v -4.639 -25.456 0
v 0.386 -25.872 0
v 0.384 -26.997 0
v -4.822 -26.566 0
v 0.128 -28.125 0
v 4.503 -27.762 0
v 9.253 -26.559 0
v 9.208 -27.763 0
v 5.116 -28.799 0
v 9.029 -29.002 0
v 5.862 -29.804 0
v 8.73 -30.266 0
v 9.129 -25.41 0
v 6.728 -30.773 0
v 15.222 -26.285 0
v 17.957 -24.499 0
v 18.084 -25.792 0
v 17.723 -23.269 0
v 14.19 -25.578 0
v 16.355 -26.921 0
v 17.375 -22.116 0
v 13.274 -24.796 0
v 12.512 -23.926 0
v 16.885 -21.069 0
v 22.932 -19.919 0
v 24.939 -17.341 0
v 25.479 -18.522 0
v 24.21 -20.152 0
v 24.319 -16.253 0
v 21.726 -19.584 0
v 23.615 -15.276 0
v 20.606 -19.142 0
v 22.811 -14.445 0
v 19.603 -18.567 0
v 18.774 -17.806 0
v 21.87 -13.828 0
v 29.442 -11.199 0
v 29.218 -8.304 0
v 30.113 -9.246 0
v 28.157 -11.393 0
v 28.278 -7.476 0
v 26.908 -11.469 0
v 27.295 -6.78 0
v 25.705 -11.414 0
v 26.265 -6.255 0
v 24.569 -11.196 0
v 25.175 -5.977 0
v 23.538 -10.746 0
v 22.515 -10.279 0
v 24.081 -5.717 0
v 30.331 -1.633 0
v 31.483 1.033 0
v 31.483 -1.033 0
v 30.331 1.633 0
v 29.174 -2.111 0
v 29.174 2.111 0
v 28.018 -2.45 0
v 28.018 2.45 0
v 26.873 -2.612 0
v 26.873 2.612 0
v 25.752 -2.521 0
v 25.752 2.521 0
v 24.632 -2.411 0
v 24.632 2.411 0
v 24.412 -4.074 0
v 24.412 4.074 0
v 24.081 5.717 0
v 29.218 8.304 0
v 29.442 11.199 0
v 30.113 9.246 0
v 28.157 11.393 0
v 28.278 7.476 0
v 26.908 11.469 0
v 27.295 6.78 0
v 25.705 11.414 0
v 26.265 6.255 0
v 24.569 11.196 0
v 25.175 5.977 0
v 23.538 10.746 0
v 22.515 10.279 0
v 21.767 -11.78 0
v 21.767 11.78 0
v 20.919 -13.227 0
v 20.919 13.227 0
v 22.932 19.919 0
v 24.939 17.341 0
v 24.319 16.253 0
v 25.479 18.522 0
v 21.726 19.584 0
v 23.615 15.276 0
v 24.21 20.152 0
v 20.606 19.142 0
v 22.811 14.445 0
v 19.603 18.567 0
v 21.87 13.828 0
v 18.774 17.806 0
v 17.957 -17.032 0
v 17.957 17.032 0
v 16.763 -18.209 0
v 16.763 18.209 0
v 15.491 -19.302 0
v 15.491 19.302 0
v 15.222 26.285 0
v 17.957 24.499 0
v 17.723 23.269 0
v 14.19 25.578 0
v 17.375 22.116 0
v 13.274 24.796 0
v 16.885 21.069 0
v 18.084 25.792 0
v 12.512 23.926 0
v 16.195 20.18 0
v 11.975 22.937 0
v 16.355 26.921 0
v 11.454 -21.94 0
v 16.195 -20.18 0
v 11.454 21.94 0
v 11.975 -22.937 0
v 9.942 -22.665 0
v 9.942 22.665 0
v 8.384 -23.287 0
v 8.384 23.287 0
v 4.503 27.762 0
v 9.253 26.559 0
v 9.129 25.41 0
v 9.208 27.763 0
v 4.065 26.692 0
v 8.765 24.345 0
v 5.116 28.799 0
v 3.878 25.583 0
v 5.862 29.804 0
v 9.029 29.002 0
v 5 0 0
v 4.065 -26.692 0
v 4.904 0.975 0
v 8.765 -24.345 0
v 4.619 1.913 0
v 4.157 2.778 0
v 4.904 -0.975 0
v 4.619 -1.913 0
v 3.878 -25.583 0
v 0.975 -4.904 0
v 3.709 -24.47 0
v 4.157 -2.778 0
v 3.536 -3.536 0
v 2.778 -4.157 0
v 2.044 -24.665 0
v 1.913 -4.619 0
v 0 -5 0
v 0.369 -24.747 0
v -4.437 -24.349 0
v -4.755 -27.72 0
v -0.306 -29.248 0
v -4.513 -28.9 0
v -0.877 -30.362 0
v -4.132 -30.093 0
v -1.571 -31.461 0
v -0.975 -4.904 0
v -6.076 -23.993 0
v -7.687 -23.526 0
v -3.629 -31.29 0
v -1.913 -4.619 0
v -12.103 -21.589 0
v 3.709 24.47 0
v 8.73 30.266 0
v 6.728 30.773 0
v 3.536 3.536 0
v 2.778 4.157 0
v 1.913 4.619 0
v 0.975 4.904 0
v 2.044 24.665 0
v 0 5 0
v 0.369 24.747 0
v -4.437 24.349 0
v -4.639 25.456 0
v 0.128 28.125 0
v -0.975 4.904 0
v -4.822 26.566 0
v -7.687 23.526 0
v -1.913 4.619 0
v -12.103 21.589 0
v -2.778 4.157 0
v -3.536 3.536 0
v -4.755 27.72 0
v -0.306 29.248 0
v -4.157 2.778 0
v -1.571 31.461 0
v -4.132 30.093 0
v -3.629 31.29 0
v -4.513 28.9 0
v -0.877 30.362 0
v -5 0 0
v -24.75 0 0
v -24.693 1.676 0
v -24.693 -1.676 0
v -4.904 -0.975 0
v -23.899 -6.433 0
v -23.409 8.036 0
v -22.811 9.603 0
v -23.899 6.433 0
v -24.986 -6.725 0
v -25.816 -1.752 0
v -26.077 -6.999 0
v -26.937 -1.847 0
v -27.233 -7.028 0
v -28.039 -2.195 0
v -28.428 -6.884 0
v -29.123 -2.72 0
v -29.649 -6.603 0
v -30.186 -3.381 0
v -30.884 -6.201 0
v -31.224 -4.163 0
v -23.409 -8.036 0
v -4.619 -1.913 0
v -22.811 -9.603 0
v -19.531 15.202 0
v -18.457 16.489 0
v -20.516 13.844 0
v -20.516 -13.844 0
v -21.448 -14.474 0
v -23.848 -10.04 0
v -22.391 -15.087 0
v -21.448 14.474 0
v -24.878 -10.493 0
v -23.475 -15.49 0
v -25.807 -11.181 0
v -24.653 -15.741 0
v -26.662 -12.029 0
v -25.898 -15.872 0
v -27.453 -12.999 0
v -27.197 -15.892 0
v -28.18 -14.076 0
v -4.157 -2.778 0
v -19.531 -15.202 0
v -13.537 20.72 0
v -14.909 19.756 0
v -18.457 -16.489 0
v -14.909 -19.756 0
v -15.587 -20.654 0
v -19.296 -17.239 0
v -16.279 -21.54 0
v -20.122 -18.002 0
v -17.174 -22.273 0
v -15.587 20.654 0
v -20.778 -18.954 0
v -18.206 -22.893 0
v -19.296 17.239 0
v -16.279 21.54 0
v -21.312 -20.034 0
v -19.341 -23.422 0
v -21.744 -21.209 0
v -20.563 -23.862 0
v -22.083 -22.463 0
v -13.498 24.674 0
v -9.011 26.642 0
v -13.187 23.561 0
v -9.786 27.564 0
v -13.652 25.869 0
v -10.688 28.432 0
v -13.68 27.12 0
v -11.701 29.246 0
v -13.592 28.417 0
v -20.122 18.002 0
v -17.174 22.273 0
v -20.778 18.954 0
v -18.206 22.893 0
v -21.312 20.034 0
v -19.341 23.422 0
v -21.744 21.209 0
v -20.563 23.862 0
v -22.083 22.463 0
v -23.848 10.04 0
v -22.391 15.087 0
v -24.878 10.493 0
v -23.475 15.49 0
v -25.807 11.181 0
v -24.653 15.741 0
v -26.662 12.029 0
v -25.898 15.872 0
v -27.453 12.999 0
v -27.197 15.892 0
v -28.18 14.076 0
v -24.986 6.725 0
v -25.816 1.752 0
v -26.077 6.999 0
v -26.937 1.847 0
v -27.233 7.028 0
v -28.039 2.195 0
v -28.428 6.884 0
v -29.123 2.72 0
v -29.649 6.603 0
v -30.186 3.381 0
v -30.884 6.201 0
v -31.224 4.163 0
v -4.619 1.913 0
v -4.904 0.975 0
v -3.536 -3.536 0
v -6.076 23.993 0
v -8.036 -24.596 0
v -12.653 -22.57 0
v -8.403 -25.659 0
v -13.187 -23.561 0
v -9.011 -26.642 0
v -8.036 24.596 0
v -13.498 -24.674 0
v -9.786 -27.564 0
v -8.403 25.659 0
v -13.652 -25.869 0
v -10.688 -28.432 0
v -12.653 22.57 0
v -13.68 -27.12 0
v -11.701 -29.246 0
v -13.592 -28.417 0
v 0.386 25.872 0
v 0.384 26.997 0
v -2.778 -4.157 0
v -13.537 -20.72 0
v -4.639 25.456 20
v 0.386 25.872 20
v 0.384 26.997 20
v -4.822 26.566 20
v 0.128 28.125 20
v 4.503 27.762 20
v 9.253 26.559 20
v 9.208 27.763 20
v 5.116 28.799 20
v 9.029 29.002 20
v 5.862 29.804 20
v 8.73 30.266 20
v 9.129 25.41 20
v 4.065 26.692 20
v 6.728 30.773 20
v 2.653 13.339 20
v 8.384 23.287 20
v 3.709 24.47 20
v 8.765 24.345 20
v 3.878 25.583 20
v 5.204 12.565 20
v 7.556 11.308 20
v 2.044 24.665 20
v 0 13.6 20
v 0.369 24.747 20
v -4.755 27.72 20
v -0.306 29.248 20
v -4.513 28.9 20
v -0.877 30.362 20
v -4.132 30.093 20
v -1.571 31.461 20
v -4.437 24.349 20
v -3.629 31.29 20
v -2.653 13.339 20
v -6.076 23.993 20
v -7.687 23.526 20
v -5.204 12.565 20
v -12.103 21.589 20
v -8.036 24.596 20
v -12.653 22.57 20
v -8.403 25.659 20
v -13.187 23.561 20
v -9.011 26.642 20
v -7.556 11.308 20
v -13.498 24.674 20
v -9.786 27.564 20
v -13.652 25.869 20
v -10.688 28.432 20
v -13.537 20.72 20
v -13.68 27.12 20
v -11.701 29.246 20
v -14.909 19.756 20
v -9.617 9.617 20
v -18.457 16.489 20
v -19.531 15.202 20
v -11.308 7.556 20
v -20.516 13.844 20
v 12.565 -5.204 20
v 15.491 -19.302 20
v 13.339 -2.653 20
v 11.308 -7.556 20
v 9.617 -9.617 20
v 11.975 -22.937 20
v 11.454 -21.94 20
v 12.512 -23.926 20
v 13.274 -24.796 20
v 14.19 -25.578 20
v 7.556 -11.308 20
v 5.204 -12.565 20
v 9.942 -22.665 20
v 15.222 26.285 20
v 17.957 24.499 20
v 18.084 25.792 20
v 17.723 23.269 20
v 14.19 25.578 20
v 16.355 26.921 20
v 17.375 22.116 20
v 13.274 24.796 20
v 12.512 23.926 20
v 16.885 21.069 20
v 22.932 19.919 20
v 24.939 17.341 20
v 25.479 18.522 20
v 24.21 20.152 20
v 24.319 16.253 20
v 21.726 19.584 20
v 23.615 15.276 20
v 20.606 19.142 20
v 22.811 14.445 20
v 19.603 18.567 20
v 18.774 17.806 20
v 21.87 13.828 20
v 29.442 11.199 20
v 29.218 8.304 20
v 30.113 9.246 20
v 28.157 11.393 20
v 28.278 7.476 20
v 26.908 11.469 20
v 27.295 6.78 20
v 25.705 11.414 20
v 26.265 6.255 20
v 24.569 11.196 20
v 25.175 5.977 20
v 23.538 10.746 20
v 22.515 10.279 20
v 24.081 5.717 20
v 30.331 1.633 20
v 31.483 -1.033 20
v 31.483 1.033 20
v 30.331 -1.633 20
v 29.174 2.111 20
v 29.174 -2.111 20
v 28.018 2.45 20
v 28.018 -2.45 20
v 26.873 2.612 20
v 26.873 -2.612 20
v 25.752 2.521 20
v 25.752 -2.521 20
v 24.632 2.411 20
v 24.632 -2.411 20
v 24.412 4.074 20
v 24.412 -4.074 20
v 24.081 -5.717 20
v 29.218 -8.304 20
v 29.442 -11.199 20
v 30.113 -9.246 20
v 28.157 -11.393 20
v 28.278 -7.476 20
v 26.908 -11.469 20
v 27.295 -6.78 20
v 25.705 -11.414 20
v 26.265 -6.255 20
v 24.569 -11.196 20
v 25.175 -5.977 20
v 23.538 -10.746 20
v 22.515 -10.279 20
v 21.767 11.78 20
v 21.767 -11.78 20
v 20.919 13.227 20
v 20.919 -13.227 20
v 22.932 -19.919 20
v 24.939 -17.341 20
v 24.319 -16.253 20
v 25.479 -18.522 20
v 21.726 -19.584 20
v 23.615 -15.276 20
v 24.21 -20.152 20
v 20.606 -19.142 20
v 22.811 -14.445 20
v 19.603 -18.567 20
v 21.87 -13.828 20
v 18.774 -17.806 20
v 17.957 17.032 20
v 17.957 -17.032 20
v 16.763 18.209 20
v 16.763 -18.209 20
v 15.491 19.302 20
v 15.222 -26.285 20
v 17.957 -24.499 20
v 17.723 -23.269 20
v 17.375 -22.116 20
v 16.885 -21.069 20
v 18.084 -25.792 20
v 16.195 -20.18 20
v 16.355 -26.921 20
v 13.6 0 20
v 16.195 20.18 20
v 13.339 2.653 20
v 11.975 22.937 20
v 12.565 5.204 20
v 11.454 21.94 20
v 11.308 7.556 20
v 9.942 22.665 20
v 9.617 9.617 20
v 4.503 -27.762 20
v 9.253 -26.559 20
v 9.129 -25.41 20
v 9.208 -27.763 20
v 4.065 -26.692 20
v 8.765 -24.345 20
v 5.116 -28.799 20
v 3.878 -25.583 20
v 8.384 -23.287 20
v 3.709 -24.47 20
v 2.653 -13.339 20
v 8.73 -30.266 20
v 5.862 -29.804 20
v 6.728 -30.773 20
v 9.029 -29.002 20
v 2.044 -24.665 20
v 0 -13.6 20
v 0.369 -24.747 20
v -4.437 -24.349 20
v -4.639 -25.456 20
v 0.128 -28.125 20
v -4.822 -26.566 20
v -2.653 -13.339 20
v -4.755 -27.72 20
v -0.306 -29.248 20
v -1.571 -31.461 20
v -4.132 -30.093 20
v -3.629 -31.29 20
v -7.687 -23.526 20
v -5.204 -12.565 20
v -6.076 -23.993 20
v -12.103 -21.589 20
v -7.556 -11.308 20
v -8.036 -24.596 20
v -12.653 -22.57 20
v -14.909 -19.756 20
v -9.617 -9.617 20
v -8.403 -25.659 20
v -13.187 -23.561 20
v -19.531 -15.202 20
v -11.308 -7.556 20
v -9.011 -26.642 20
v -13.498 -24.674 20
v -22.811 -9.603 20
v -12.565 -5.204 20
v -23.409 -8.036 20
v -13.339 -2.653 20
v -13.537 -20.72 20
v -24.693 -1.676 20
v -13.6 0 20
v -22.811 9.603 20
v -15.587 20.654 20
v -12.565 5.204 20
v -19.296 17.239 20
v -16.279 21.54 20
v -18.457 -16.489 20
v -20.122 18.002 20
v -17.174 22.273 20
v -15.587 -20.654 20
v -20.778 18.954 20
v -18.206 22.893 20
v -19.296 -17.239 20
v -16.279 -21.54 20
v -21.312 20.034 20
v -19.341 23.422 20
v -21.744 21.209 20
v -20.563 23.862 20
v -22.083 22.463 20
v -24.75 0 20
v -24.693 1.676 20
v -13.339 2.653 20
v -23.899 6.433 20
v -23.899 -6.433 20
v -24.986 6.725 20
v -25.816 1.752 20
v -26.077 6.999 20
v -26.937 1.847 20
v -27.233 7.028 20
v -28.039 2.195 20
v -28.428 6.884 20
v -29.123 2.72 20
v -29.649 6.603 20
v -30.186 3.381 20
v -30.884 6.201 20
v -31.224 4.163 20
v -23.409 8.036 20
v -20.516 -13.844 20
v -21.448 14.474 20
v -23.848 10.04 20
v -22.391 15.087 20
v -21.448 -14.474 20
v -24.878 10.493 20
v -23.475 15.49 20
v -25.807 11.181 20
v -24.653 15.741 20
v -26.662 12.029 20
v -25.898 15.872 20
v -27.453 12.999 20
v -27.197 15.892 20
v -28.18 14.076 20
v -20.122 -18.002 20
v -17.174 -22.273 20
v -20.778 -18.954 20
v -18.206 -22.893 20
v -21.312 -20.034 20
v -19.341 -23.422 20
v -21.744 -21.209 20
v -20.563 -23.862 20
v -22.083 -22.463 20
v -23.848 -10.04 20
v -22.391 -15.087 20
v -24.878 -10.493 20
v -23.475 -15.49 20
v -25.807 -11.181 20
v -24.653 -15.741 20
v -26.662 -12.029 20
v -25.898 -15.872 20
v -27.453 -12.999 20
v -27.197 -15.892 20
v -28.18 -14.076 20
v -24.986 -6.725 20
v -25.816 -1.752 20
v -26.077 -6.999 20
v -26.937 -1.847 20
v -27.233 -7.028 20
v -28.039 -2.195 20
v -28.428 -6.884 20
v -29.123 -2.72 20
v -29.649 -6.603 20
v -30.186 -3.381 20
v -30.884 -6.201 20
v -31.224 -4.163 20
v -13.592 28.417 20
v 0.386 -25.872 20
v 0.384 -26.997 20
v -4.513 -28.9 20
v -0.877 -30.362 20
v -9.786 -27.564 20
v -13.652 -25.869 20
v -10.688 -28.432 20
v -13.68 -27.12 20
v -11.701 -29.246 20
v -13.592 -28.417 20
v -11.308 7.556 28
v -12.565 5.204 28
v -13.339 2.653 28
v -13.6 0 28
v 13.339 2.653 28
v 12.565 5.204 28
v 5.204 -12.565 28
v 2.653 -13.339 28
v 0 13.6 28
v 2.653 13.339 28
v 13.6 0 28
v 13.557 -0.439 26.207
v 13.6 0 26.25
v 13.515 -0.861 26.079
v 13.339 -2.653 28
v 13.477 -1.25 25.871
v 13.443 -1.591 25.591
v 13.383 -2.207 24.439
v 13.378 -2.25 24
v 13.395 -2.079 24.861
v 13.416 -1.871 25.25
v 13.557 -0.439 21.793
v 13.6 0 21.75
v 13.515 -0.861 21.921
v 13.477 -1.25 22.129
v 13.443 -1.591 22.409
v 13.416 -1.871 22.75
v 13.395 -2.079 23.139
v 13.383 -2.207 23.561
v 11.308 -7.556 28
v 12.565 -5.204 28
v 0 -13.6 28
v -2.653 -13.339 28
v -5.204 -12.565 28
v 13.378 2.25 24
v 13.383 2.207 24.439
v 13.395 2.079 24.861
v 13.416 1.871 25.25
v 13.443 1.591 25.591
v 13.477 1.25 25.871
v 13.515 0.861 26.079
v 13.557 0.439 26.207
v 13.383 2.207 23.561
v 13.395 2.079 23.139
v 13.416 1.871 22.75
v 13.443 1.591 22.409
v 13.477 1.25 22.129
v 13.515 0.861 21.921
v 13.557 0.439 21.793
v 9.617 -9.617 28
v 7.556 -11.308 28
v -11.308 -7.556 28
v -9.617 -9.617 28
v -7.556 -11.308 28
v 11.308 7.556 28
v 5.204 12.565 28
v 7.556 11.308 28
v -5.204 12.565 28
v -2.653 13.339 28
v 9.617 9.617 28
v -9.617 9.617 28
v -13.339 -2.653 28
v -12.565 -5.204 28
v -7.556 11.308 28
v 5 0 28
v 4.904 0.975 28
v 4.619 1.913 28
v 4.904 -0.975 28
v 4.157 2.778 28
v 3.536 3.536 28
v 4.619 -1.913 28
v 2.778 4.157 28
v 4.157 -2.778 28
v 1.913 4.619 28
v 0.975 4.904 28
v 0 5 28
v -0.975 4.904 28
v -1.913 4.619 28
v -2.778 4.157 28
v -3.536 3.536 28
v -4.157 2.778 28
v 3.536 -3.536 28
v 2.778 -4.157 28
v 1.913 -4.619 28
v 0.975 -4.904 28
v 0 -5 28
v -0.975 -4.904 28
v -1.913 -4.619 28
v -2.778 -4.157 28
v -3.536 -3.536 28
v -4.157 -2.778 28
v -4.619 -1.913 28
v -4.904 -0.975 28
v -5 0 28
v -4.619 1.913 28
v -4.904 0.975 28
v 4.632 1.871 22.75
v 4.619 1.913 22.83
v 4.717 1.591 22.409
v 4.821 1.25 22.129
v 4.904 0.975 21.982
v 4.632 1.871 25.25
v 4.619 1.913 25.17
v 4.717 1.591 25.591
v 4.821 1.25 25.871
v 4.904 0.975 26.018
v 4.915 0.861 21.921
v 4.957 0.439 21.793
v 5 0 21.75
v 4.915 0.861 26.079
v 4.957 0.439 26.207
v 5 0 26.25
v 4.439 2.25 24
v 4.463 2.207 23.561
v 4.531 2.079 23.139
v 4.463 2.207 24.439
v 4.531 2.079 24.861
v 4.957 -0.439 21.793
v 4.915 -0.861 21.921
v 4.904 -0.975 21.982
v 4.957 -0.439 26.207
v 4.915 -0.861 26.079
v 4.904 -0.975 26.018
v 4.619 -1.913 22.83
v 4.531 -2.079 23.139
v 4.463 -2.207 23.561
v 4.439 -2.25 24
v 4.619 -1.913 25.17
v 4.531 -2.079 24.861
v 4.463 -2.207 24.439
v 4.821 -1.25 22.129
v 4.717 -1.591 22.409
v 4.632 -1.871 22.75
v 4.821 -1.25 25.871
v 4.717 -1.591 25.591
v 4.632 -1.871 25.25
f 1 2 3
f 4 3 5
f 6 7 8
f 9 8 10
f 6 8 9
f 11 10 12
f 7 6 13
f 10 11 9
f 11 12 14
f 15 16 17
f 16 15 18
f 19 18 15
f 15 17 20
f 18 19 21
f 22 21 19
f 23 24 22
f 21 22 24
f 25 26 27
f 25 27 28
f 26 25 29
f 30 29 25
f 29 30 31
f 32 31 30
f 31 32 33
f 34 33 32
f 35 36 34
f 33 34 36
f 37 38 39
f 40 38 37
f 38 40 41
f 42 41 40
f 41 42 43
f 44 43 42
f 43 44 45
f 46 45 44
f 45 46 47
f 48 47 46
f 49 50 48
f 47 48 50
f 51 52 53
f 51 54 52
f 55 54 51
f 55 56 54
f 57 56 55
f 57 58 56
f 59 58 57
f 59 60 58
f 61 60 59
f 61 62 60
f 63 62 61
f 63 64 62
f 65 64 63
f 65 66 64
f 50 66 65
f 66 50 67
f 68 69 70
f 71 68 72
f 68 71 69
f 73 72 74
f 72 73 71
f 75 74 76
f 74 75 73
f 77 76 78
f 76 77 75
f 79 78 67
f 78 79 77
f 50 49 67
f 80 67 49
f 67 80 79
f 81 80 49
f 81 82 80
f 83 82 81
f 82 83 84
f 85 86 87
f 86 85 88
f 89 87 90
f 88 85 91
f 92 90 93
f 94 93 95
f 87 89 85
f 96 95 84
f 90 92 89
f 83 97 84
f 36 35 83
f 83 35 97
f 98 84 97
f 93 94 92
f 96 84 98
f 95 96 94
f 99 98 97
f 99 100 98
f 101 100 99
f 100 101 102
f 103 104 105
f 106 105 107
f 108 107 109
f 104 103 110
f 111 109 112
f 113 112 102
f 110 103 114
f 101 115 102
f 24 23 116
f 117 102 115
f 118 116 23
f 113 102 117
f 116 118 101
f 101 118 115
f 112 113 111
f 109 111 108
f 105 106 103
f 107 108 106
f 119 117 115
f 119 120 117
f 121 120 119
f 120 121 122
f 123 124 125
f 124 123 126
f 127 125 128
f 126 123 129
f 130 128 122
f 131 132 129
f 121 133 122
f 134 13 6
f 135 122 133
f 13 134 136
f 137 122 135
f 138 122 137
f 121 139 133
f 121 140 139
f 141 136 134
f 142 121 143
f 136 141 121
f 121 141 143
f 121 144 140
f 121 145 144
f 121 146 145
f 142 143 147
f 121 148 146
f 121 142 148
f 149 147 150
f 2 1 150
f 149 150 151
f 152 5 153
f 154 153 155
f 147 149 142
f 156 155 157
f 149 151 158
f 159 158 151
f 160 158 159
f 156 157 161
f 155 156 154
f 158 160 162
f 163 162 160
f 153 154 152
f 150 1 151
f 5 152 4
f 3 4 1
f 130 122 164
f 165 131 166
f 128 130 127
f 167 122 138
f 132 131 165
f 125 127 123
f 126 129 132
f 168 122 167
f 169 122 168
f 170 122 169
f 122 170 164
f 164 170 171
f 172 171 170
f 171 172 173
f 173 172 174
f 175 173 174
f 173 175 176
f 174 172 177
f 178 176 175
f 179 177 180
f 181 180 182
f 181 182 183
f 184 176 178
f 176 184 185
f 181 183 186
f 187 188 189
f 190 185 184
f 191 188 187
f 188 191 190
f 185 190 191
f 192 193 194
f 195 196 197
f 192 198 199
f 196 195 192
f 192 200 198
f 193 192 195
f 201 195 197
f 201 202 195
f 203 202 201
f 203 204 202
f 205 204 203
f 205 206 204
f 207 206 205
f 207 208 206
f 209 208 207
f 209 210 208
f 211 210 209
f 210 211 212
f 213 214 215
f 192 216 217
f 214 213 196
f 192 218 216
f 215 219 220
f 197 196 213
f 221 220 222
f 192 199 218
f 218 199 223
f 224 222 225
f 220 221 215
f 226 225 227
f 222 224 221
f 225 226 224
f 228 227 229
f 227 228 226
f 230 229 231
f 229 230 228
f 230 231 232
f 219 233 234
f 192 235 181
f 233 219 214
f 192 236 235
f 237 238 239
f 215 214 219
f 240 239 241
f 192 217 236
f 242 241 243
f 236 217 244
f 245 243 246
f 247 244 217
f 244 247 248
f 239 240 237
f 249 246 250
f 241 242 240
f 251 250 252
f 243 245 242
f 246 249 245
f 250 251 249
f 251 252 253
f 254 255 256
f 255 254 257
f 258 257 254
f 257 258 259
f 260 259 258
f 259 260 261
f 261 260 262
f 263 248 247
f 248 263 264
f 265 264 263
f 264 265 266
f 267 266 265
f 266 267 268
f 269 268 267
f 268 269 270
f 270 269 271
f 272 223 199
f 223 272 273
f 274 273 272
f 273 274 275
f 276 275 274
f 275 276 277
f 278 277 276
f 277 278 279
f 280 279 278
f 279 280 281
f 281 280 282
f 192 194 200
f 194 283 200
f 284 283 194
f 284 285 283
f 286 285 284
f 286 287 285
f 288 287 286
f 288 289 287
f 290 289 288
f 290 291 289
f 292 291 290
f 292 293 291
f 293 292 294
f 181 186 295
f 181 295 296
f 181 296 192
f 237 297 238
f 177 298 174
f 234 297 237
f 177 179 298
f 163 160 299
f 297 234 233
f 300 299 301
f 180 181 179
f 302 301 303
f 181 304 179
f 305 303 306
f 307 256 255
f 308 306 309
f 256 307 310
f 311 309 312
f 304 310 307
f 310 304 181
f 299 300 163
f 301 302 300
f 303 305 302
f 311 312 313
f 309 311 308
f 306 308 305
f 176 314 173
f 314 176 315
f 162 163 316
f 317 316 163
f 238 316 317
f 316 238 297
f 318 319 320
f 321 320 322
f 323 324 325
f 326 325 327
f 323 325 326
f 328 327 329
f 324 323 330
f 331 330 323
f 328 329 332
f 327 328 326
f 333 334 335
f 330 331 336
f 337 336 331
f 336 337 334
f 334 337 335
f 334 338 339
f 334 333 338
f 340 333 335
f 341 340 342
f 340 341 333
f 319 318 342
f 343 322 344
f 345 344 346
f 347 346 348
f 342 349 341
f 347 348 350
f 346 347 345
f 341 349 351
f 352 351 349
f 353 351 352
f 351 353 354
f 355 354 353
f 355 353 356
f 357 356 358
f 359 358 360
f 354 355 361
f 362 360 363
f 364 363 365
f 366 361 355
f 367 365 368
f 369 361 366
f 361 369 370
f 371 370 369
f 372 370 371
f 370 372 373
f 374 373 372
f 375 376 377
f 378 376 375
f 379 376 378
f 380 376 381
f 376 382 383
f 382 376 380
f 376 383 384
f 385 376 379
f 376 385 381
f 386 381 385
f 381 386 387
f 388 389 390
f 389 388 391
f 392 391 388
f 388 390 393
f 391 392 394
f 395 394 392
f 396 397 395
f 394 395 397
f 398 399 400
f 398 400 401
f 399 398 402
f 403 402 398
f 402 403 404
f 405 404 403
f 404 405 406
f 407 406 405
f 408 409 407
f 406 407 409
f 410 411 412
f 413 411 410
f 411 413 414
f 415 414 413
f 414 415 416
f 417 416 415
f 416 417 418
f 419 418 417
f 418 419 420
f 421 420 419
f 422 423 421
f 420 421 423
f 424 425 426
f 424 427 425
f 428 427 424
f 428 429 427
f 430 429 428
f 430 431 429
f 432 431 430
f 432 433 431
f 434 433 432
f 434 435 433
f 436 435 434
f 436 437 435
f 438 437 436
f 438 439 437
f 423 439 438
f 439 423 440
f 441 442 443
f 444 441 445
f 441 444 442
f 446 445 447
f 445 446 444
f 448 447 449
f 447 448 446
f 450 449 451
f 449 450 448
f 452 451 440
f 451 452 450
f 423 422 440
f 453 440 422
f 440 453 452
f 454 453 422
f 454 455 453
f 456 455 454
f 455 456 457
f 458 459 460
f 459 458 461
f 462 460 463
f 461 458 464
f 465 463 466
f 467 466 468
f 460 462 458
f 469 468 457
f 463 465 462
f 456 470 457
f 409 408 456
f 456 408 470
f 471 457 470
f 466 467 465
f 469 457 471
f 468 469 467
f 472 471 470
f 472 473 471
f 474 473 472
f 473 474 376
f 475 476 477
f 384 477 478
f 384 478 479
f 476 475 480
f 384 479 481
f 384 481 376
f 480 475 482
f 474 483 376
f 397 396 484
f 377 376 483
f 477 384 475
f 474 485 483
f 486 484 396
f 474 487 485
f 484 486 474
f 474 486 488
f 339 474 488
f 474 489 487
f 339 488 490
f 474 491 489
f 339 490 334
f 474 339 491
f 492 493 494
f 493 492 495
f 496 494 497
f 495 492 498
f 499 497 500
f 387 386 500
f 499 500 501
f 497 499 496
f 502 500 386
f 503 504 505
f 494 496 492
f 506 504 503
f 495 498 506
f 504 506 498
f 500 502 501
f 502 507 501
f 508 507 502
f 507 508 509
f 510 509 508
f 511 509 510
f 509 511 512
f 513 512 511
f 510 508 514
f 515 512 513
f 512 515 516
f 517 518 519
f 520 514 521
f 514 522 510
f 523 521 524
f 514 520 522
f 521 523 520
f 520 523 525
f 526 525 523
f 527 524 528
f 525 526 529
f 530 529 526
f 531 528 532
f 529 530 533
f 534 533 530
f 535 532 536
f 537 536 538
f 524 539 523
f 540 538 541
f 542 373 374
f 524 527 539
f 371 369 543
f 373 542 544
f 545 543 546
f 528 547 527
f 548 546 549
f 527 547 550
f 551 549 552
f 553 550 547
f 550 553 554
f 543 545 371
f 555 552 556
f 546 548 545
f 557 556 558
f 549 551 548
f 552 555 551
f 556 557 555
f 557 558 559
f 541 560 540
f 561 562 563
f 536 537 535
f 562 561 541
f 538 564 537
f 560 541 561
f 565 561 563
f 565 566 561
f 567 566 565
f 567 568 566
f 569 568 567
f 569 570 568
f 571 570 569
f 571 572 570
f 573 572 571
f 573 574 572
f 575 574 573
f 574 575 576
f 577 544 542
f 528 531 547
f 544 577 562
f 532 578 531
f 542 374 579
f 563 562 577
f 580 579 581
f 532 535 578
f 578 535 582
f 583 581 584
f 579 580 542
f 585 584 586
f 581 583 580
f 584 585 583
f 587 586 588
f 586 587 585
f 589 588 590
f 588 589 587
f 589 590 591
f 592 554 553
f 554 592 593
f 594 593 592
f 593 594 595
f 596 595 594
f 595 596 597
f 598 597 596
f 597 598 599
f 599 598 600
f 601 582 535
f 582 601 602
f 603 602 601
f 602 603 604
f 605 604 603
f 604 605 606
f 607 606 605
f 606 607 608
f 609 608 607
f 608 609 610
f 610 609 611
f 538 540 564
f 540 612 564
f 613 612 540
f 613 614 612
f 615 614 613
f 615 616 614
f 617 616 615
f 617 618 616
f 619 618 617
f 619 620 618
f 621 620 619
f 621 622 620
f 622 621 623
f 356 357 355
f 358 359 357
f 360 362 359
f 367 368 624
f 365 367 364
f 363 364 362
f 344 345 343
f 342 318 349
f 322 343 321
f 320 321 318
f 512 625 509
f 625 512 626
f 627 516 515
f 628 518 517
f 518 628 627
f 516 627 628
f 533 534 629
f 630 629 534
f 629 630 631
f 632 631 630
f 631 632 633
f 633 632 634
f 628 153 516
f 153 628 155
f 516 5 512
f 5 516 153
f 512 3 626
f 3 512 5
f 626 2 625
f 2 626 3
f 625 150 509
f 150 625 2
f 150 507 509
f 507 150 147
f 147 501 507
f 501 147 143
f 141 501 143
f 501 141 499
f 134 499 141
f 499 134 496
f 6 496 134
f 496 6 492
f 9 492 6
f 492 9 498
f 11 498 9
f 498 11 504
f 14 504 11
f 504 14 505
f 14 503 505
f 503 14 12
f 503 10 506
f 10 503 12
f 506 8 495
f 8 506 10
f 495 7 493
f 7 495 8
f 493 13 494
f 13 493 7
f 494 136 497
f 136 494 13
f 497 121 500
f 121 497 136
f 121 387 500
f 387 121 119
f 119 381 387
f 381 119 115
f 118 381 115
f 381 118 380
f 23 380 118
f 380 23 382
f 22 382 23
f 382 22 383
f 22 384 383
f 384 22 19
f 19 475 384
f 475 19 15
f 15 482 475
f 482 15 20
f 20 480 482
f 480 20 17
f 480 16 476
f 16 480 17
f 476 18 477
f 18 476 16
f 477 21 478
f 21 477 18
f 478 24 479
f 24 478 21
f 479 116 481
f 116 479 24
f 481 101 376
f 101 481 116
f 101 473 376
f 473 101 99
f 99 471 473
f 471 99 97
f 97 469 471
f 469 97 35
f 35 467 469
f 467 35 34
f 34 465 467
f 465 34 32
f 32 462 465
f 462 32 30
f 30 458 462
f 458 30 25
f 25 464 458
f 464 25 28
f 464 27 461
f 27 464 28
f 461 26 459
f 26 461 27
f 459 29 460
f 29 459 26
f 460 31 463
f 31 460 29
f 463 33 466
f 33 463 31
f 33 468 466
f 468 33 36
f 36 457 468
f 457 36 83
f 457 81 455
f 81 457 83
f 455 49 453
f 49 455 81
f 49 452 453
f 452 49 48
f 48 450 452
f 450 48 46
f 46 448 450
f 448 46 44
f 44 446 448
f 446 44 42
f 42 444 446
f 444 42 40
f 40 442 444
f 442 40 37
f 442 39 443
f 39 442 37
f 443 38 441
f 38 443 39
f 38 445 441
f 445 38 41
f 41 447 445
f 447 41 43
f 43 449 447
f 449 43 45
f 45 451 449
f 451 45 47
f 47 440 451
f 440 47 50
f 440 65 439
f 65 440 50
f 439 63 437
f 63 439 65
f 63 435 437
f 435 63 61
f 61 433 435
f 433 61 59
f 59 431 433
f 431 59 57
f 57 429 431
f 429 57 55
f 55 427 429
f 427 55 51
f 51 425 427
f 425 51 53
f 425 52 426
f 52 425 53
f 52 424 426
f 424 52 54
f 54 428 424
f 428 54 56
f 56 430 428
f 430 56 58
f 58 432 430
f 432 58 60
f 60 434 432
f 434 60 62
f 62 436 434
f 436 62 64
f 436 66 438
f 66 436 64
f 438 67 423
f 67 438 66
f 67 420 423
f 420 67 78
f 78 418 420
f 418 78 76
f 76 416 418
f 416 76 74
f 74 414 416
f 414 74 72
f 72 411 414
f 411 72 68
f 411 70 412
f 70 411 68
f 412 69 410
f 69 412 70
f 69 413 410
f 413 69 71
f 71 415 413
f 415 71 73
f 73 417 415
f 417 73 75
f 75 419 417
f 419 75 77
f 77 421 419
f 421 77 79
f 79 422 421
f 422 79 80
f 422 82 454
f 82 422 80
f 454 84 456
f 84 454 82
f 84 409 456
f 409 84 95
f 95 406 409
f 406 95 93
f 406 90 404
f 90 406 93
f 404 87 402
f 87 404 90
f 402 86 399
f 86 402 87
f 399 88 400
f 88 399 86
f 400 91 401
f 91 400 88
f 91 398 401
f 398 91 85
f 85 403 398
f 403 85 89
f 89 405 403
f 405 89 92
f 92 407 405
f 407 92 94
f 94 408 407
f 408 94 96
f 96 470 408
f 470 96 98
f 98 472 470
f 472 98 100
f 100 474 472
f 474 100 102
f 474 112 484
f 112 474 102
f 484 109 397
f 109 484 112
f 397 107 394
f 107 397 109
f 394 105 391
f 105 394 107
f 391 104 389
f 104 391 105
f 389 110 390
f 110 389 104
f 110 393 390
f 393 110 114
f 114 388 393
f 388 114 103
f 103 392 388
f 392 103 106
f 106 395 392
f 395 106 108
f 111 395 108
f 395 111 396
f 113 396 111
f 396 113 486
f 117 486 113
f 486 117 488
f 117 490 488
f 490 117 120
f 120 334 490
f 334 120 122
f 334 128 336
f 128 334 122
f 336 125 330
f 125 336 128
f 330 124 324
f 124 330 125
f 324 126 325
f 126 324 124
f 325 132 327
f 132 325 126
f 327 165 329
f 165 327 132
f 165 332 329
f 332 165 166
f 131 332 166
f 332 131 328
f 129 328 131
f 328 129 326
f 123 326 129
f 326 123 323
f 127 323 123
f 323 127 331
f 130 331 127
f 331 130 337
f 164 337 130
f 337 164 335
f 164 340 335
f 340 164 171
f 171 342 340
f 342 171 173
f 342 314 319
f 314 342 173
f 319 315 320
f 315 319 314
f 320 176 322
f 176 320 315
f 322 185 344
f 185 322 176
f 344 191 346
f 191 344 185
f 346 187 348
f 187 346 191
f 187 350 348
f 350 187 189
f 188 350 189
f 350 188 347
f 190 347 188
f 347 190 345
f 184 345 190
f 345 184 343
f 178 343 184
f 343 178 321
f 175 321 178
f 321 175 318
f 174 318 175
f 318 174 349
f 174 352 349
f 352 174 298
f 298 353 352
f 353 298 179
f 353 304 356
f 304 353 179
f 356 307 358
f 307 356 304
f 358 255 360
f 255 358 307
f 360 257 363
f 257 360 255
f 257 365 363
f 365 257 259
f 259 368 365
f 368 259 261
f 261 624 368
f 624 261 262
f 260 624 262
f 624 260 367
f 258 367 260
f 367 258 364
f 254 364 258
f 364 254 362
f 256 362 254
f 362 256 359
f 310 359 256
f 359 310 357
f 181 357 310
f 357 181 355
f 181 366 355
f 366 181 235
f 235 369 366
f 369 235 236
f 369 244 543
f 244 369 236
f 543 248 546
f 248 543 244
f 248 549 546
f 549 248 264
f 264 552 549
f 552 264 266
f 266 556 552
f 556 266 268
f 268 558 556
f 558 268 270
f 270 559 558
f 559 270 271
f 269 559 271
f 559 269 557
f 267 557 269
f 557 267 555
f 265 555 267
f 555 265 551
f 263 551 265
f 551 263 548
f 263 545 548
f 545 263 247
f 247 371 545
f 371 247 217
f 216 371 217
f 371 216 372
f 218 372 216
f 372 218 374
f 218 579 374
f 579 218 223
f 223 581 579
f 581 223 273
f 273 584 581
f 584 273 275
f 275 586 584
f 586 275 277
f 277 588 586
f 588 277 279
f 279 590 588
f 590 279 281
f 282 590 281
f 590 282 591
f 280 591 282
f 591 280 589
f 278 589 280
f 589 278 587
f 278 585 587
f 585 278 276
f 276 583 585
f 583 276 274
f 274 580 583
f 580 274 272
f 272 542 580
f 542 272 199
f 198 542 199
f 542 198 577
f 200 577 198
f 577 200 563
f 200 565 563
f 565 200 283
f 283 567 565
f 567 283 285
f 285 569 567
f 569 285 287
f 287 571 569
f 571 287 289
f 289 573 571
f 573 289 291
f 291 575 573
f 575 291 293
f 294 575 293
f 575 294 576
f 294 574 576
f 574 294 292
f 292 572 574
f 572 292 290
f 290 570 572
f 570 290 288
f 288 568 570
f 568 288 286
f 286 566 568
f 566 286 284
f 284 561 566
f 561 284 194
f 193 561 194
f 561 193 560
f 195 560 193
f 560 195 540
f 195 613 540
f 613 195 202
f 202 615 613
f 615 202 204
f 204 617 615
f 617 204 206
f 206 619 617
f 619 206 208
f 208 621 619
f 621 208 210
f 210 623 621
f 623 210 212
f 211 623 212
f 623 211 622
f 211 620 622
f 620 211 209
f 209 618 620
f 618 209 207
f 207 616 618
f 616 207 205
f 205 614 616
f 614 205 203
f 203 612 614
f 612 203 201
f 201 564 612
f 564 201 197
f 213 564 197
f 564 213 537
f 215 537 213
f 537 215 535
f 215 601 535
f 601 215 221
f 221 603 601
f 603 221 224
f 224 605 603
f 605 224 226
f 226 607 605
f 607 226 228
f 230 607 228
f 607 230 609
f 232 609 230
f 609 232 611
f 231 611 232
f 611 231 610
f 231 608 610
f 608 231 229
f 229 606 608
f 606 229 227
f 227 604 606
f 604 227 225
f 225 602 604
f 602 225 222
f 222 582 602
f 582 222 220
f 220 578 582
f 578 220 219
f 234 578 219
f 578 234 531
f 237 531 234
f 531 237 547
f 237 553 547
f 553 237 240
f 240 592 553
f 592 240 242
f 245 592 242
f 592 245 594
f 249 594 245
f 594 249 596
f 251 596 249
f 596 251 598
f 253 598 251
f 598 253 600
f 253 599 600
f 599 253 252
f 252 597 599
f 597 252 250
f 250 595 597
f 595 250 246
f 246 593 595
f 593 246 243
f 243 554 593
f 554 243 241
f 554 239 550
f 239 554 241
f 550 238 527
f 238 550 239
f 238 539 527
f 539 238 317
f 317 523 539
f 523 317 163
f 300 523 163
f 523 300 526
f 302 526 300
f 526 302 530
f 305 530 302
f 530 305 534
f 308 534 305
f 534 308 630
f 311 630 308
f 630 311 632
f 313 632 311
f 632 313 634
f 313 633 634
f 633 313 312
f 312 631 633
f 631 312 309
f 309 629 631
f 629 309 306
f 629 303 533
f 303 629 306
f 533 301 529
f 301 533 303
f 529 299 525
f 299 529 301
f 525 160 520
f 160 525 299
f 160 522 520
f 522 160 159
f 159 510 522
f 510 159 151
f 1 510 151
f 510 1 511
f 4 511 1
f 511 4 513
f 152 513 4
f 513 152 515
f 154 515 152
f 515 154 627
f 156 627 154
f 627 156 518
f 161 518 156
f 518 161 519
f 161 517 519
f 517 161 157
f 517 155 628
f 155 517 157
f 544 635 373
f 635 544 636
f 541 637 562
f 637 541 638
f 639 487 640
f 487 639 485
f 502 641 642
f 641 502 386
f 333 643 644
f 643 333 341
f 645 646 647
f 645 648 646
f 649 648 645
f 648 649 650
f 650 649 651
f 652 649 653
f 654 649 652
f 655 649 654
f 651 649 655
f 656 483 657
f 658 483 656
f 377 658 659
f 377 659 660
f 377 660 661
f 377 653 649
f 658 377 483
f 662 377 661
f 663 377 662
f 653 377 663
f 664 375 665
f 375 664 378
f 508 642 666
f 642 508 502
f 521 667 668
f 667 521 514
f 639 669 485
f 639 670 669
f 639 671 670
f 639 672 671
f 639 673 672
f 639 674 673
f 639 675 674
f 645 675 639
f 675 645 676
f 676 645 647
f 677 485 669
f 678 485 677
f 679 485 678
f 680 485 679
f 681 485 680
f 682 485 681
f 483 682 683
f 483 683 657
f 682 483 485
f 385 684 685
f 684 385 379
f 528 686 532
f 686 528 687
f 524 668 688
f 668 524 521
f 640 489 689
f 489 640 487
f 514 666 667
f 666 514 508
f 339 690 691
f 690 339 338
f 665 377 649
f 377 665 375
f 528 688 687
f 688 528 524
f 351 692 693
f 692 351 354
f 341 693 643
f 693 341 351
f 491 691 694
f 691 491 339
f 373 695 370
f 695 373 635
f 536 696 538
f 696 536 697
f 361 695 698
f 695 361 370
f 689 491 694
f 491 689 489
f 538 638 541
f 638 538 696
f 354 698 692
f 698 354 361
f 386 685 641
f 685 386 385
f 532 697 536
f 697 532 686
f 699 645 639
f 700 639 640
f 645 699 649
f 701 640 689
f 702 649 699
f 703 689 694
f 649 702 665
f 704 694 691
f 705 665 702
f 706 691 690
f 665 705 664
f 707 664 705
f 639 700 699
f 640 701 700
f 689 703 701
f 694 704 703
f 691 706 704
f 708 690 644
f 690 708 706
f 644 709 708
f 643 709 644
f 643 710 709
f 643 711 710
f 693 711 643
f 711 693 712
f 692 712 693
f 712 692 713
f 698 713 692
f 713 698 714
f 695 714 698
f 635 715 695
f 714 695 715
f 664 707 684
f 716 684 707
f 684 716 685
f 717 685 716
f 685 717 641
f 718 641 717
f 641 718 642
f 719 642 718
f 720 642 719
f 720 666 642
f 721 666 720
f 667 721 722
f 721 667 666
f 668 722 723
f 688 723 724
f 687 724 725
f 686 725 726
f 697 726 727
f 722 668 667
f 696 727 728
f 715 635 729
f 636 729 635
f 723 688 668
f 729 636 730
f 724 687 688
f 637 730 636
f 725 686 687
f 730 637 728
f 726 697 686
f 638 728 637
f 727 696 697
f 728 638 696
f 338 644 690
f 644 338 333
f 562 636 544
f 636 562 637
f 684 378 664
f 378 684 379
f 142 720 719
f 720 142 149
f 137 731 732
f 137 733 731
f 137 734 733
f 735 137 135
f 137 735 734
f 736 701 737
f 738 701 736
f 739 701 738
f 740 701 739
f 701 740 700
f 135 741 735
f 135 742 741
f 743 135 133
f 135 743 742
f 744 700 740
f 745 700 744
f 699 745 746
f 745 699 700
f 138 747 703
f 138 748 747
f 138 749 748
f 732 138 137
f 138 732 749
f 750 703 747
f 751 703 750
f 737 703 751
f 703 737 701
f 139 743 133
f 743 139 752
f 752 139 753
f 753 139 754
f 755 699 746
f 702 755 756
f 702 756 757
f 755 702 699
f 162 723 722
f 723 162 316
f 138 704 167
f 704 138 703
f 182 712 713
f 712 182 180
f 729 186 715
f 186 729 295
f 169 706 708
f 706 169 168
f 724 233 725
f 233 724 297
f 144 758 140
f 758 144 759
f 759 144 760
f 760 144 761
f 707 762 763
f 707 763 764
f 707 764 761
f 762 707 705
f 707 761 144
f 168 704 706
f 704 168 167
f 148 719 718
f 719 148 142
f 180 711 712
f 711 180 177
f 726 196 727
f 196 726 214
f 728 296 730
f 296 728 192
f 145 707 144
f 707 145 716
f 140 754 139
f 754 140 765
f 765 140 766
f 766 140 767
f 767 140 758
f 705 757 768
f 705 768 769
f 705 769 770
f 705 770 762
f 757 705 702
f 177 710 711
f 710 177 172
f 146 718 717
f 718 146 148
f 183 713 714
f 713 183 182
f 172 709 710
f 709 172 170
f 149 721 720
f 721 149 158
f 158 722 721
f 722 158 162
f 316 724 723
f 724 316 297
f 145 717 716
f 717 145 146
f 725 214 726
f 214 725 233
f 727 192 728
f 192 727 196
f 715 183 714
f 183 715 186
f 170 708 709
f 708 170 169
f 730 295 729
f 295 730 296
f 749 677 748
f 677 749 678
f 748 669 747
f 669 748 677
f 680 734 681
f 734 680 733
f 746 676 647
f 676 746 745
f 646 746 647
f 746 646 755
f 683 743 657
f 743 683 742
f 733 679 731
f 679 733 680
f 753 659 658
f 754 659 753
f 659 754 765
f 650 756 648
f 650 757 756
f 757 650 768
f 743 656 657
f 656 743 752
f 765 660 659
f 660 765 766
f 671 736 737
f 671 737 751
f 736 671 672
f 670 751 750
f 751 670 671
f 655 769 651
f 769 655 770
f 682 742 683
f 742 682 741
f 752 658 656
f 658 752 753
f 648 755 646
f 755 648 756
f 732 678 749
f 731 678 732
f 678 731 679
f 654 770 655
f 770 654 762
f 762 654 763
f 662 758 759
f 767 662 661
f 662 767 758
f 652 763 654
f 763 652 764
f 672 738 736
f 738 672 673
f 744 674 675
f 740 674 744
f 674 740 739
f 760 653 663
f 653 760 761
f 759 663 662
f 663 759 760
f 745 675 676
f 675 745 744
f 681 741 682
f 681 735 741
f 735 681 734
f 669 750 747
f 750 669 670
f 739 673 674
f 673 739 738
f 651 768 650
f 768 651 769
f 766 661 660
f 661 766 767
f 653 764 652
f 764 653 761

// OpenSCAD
$fn = 32;

// ----------------------------------------------------------------------
// Spur gear: m=3 z=19, 63 mm tip diameter x 28 mm
// ----------------------------------------------------------------------

// --- parameters (mm) ---
module_m = 3;             // module
teeth = 19;               // number of teeth
face_w = 20;              // face width
pa = 20;                  // pressure angle, deg
bore_d = 10;              // shaft bore
hub_d = 27.2;             // hub diameter
hub_h = 8;                // hub above the face
set_d = 4.5;              // set screw tap hole
set_z = 24;               // set screw height

/* --- involute profile --- */
pitch_r = module_m * teeth / 2;
base_r = pitch_r * cos(pa);
tip_r = pitch_r + module_m;
root_r = pitch_r - 1.25 * module_m;
flank_steps = 6;

function inv_deg(a) = (tan(a) - a * PI / 180) * 180 / PI;
function flank_r(i) = root_r + (tip_r - root_r) * i / flank_steps;
function half_angle(r) = 90 / teeth + inv_deg(pa) - inv_deg(acos(min(1, base_r / r)));
function tooth_pt(k, i, side) =
    let (r = flank_r(i), a = k * 360 / teeth + side * half_angle(r))
    [r * cos(a), r * sin(a)];

module tooth_profile() {
  polygon(points = [
    for (k = [0 : teeth - 1])
      each [
        for (i = [0 : flank_steps]) tooth_pt(k, i, -1),
        for (i = [flank_steps : -1 : 0]) tooth_pt(k, i, 1),
        let (ta = (k + 0.5) * 360 / teeth)
          [root_r * cos(ta), root_r * sin(ta)]
      ]
  ]);
}

module gear_disc() {
  linear_extrude(height = face_w) tooth_profile();
}

module hub_boss() {
  translate([0, 0, face_w - 1]) cylinder(h = hub_h + 1, d = hub_d);
}

difference() {
  union() {
    gear_disc();
    hub_boss();
  }
  translate([0, 0, -1]) cylinder(h = face_w + hub_h + 3, d = bore_d);
  /* set screw, drilled radially */
  translate([-1, 0, set_z]) rotate([0, 90, 0]) cylinder(h = hub_d / 2 + 3, d = set_d);
}
